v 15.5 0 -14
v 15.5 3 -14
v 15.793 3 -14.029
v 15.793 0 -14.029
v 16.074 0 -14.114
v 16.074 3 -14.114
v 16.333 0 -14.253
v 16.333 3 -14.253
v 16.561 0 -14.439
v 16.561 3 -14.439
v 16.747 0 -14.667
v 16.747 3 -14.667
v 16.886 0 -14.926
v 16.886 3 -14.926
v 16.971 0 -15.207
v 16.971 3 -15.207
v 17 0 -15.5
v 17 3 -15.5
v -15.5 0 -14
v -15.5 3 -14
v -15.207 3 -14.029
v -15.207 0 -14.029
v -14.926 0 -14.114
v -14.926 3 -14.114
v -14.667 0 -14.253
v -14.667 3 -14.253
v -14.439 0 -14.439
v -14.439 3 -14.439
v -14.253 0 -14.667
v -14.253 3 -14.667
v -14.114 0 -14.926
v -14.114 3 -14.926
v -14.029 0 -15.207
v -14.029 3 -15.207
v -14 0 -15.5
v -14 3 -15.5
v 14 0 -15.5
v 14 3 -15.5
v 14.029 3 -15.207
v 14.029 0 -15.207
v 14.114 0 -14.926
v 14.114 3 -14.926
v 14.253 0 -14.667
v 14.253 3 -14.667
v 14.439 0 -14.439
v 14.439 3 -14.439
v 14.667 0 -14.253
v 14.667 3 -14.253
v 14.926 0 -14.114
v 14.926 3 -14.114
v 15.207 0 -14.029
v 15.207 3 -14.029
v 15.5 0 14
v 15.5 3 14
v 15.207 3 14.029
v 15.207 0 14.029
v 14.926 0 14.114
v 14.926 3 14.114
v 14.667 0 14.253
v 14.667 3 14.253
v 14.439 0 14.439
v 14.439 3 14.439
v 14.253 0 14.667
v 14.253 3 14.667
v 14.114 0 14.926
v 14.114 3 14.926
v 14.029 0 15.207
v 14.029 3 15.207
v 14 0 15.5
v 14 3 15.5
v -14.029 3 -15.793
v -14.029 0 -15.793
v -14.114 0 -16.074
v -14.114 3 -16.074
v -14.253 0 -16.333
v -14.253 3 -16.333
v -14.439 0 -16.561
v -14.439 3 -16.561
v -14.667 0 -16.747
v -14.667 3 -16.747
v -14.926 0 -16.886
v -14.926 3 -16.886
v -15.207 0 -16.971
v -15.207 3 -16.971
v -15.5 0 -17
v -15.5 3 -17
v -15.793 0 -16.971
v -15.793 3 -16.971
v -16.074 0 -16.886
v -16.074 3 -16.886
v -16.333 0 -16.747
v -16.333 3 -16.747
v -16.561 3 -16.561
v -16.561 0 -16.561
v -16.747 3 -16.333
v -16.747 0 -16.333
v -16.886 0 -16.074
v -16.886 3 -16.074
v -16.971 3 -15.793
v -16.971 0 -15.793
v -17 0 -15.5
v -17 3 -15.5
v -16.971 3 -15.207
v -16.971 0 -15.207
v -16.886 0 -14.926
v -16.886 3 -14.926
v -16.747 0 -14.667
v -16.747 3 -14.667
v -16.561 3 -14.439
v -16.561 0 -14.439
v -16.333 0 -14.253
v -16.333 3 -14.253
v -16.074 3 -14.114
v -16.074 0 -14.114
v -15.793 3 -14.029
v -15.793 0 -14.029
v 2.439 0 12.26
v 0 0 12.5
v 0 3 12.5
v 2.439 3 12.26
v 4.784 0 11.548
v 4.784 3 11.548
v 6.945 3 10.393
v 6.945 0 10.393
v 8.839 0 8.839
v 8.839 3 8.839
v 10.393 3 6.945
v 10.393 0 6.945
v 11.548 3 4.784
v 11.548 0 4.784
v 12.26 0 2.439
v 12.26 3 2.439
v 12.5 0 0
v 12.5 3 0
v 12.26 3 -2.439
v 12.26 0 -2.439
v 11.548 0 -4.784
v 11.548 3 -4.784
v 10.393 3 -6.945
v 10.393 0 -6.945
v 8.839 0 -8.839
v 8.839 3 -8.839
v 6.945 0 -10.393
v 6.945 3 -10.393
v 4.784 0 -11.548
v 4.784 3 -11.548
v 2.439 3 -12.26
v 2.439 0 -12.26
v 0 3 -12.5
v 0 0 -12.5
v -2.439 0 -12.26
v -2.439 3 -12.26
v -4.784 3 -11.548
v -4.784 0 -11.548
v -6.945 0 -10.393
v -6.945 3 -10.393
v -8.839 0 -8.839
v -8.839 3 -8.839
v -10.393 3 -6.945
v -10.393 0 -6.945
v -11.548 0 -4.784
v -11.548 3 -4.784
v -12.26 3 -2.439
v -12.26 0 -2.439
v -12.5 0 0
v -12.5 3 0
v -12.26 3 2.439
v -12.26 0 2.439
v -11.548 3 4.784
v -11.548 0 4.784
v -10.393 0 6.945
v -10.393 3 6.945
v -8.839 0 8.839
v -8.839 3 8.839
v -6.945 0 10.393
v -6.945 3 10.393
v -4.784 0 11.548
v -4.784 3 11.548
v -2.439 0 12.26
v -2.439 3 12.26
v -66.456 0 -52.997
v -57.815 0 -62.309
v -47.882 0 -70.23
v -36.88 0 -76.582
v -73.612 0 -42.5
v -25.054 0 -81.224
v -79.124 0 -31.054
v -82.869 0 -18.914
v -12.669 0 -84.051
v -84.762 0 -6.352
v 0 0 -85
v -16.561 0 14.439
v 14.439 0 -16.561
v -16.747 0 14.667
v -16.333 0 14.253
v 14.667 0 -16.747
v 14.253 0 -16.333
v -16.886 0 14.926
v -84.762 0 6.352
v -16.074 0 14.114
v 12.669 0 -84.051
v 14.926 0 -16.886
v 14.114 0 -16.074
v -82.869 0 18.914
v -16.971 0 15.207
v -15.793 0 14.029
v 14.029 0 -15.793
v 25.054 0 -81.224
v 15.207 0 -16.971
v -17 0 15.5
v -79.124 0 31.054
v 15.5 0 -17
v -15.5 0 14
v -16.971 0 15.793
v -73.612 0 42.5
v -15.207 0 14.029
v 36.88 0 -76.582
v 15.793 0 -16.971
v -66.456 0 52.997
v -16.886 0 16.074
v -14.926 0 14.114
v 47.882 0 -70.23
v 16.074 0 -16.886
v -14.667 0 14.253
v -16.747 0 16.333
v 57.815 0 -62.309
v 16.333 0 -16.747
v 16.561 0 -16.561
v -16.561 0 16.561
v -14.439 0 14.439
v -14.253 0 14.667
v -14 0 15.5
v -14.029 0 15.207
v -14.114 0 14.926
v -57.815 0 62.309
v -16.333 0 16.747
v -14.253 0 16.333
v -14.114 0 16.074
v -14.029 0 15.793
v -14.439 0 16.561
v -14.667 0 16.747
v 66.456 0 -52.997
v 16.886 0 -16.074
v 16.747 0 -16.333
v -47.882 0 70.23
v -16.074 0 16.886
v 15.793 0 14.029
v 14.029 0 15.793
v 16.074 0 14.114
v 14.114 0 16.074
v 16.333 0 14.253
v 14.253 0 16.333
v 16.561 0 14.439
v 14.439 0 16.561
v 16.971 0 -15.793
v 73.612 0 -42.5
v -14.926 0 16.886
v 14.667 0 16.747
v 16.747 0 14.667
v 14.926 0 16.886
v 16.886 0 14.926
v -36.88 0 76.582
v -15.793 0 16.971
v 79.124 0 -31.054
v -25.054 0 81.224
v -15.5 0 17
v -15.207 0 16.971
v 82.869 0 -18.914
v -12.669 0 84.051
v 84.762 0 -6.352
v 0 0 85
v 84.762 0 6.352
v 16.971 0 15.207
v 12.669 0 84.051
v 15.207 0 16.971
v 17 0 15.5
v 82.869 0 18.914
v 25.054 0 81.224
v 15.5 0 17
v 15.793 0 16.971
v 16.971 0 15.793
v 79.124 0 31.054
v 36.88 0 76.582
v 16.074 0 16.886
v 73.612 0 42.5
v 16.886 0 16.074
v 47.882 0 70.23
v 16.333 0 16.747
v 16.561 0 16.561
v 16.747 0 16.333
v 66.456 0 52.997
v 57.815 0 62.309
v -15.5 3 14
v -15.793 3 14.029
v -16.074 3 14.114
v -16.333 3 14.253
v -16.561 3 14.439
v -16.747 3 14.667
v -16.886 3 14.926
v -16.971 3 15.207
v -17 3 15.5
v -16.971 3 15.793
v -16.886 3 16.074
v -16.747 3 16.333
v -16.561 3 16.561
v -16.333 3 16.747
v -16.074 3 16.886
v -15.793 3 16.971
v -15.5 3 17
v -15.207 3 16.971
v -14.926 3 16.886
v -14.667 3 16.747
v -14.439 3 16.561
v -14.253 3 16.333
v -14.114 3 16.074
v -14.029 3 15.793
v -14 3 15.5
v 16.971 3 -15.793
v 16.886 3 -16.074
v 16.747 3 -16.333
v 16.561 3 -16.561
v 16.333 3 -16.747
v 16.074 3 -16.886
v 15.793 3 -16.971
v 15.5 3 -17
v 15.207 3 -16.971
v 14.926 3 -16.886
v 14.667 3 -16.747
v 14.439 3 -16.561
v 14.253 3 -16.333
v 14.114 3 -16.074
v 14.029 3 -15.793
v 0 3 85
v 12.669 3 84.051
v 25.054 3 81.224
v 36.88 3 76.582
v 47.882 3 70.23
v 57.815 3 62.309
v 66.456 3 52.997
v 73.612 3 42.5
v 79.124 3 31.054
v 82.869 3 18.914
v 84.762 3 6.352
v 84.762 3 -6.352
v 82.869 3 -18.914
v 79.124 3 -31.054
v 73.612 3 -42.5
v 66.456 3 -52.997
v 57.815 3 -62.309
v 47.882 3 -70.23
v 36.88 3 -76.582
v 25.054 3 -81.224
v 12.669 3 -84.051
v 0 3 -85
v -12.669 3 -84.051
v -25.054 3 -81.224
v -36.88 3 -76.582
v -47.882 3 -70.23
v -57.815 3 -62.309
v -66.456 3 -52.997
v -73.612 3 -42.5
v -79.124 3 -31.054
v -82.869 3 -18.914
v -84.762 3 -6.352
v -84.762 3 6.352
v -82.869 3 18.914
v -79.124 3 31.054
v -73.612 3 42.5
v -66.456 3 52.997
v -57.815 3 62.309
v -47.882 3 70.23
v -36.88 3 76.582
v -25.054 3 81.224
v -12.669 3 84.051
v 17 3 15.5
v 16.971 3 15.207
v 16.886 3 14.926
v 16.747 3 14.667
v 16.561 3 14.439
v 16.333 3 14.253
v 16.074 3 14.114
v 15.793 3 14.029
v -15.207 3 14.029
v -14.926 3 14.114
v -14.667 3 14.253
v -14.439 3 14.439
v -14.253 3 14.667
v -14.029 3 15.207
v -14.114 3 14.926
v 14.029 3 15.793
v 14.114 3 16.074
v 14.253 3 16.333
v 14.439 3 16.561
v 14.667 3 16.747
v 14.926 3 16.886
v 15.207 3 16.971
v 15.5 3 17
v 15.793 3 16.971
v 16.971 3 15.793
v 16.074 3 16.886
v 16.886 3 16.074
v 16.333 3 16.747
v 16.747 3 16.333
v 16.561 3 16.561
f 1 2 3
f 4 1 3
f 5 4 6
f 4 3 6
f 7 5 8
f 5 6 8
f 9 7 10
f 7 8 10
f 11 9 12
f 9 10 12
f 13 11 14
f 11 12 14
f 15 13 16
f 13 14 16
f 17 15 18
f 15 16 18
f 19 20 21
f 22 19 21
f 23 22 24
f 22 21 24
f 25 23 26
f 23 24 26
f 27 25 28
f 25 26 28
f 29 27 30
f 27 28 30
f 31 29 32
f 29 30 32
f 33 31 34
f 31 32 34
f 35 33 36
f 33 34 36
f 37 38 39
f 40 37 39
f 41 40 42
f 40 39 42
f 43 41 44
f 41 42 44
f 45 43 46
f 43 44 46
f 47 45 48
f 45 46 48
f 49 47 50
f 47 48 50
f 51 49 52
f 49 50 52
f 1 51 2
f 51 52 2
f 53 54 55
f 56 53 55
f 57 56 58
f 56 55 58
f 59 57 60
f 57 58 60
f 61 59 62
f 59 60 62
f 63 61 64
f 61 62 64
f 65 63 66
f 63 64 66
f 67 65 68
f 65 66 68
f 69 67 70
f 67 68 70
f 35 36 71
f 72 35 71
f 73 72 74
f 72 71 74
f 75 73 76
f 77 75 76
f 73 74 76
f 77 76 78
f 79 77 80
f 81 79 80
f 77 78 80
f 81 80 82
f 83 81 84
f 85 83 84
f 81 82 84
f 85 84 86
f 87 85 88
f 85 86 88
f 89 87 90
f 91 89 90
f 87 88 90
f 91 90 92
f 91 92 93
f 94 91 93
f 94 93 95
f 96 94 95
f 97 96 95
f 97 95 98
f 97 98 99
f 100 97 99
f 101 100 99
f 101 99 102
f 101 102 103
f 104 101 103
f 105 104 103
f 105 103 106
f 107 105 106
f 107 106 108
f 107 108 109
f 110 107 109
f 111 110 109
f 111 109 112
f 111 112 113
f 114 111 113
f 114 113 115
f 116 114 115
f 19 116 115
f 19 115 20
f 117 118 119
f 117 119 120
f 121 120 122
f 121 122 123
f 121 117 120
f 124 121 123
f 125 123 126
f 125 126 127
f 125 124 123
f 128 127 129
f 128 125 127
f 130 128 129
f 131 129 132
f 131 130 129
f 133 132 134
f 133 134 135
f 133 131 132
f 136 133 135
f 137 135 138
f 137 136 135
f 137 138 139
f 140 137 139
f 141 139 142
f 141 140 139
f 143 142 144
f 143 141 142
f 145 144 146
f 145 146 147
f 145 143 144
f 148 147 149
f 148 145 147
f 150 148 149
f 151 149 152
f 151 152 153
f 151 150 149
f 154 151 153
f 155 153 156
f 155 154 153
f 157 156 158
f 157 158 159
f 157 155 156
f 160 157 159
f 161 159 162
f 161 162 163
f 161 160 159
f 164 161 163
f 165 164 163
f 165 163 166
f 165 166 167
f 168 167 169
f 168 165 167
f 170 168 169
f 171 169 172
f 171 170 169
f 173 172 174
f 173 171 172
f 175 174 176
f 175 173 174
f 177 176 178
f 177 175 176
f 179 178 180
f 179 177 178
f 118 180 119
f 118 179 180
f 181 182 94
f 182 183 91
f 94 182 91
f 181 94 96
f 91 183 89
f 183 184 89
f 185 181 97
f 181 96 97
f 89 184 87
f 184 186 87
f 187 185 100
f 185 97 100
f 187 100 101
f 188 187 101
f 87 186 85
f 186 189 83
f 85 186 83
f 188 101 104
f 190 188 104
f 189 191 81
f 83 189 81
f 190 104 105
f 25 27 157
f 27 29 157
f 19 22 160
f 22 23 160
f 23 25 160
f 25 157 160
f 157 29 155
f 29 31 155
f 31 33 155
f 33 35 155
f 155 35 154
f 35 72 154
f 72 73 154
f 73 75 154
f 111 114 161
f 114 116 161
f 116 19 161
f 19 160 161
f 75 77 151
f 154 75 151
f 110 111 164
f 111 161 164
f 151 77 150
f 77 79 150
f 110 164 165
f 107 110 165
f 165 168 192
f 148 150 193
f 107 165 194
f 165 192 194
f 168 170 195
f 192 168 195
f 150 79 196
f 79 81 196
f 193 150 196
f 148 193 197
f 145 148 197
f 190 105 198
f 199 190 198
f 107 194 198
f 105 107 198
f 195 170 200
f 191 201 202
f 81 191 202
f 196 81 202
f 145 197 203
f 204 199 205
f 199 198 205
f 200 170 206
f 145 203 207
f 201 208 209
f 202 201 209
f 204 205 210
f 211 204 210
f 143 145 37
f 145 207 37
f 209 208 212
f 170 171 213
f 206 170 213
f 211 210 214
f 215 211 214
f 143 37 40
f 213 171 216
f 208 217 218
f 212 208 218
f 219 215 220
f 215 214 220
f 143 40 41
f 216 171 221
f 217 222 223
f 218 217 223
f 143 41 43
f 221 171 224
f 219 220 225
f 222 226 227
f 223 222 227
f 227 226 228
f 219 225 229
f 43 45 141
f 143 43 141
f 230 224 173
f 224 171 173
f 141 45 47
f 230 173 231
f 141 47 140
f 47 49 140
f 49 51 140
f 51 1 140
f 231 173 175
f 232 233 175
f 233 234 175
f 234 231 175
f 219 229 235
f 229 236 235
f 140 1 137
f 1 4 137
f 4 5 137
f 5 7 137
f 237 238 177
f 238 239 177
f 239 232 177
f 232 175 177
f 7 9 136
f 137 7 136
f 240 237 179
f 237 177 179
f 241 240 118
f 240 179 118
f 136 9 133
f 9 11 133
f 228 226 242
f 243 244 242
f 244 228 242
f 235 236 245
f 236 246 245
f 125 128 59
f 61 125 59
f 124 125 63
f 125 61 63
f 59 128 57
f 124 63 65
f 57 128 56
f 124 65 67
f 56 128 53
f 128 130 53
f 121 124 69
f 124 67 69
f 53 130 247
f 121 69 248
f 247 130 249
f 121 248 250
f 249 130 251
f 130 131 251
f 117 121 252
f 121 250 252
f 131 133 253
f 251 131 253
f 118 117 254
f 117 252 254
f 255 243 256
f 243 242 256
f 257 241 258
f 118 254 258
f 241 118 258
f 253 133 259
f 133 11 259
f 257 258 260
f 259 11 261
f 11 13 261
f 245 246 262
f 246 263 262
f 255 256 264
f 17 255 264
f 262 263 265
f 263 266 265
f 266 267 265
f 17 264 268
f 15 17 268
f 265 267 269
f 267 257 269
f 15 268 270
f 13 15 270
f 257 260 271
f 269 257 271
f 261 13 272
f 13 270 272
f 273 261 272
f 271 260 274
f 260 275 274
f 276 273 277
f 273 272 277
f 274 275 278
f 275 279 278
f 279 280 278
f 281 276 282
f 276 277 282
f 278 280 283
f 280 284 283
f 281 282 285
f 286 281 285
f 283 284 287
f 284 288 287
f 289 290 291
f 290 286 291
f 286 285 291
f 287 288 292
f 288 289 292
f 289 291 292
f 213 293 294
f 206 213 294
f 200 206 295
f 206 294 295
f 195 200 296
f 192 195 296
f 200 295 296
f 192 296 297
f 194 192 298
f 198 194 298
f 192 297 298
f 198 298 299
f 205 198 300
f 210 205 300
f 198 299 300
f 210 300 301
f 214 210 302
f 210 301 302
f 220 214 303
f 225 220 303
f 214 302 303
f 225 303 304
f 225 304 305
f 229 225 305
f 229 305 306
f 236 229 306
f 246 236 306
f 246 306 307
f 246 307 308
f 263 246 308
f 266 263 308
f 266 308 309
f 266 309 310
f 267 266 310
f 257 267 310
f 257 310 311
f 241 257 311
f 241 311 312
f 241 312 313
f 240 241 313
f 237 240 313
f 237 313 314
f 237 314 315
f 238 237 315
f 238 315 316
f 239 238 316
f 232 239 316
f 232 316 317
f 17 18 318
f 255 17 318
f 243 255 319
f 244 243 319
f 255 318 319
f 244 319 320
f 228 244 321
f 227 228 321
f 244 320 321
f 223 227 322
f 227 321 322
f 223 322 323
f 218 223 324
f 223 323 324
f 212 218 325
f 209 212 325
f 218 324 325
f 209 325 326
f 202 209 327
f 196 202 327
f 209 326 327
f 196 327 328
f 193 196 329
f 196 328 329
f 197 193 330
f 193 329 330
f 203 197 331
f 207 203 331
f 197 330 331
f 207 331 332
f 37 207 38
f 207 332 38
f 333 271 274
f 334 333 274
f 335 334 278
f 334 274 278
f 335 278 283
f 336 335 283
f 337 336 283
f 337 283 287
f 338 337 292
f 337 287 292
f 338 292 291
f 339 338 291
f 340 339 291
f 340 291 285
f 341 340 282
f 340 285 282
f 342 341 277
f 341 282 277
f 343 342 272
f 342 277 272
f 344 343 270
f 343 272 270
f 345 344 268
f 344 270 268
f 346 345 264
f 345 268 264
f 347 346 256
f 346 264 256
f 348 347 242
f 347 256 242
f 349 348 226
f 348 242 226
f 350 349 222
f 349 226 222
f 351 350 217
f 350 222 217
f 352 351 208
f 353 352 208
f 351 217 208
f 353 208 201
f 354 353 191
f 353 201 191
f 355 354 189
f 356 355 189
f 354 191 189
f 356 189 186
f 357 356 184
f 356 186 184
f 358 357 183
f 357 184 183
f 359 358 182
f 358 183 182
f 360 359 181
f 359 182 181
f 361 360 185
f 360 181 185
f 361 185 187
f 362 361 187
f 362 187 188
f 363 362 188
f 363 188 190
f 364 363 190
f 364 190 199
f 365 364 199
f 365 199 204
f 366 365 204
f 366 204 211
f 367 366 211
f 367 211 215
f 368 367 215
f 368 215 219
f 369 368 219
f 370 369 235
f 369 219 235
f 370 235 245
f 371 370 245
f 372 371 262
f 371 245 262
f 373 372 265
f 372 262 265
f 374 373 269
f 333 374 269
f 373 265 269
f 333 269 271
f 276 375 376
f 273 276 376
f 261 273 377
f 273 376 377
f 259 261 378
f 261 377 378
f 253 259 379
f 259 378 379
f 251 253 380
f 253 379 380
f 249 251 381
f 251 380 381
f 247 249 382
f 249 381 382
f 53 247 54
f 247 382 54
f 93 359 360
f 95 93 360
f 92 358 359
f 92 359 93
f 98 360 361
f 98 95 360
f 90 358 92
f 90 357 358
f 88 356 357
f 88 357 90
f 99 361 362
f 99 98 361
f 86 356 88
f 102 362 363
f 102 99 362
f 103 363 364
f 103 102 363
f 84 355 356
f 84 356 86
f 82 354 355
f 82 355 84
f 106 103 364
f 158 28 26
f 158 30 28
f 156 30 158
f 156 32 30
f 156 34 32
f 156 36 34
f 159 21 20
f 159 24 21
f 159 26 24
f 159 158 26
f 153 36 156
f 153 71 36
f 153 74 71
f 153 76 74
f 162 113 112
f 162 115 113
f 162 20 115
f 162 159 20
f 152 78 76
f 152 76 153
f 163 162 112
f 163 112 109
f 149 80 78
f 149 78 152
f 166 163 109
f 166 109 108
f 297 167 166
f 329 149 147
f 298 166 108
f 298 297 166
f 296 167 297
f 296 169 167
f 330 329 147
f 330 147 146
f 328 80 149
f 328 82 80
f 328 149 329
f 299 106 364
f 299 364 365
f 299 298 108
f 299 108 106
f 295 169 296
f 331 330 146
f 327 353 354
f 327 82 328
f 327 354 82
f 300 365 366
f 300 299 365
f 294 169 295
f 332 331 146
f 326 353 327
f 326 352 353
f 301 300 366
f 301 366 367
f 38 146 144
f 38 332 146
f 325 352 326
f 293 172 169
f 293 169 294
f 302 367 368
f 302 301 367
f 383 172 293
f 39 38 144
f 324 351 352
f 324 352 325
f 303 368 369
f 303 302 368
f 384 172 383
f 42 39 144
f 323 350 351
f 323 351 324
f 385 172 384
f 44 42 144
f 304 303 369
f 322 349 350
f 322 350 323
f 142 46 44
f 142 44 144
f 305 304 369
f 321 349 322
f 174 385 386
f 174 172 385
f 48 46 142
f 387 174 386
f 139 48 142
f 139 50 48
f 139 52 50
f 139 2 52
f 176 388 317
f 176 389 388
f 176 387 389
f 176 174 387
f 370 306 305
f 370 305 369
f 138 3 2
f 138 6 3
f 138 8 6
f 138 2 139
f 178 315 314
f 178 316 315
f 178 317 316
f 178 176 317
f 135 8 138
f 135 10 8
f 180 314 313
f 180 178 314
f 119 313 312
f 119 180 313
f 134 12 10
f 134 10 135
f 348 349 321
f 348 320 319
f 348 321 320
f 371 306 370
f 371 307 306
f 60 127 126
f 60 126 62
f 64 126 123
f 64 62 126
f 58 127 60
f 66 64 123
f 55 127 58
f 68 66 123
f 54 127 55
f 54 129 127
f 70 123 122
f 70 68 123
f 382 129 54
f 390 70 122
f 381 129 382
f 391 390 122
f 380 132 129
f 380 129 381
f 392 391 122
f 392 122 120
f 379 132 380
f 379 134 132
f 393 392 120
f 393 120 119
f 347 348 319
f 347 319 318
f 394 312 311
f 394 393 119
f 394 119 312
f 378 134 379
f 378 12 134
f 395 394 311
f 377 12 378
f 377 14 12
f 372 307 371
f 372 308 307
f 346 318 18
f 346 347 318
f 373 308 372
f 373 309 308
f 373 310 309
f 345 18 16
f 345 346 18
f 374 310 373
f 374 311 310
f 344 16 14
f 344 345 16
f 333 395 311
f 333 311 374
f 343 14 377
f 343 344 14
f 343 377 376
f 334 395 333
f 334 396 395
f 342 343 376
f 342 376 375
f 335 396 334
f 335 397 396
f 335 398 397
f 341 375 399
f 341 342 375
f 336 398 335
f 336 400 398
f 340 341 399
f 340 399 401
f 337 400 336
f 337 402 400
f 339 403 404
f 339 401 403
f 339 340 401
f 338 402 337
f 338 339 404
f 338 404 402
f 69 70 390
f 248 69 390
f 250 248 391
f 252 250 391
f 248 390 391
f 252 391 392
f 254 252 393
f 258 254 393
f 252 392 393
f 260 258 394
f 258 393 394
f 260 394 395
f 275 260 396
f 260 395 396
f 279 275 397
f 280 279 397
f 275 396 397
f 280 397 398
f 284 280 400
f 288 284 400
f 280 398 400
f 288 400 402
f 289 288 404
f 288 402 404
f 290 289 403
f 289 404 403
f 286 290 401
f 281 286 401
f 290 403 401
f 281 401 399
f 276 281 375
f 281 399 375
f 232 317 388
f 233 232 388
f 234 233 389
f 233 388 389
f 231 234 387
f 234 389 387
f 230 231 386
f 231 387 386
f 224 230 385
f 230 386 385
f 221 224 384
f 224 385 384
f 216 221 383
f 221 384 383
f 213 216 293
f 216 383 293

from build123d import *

# Parameters (mm, degrees)
SKETCH1_R           = 85
SKETCH1_R_2         = 12.5
BOSS_EXTRUDE1_DEPTH = 3
CUT_EXTRUDE1_DEPTH  = 10


with BuildPart() as part:
    # Sketch1 → Boss-Extrude1 (new body)
    with BuildSketch(Plane(origin=(0, 0, 0), x_dir=(1, 0, 0), z_dir=(0, 1, 0))):
        with Locations(Location((0, 0, 0), (0, 0, 270))):
            Circle(SKETCH1_R)
        with Locations(Location((0, 0, 0), (0, 0, 270))):
            Circle(SKETCH1_R_2, mode=Mode.SUBTRACT)
    extrude(amount=BOSS_EXTRUDE1_DEPTH)

    # Sketch2 → Cut-Extrude1 (cut)
    with BuildSketch(Plane(origin=(0, 3, 0), x_dir=(1, 0, 0), z_dir=(0, 1, 0))):
        with BuildLine():
            ThreePointArc((-14, 15.5), (-16.560660172, 16.560660172), (-15.5, 14))
            Line((-15.5, 14), (-15.5, 15.5))
            Line((-15.5, 15.5), (-14, 15.5))
        make_face()
        with BuildLine():
            Line((-15.5, 15.5), (-15.5, 14))
            ThreePointArc((-15.5, 14), (-14.439339828, 14.439339828), (-14, 15.5))
            Line((-14, 15.5), (-15.5, 15.5))
        make_face()
        with BuildLine():
            ThreePointArc((14, 15.5), (14.439339828, 14.439339828), (15.5, 14))
            Line((15.5, 14), (15.5, 15.5))
            Line((15.5, 15.5), (14, 15.5))
        make_face()
        with BuildLine():
            Line((15.5, 15.5), (15.5, 14))
            ThreePointArc((15.5, 14), (16.560660172, 14.439339828), (17, 15.5))
            ThreePointArc((17, 15.5), (15.5, 17), (14, 15.5))
            Line((14, 15.5), (15.5, 15.5))
        make_face()
        with BuildLine():
            ThreePointArc((15.5, -14), (14.439339828, -14.439339828), (14, -15.5))
            Line((14, -15.5), (15.5, -15.5))
            Line((15.5, -15.5), (15.5, -14))
        make_face()
        with BuildLine():
            Line((15.5, -15.5), (14, -15.5))
            ThreePointArc((14, -15.5), (15.5, -17), (17, -15.5))
            ThreePointArc((17, -15.5), (16.560660172, -14.439339828), (15.5, -14))
            Line((15.5, -14), (15.5, -15.5))
        make_face()
        with BuildLine():
            Line((-15.5, -14), (-15.5, -15.5))
            Line((-15.5, -15.5), (-14, -15.5))
            ThreePointArc((-14, -15.5), (-14.439339828, -14.439339828), (-15.5, -14))
        make_face()
        with BuildLine():
            Line((-14, -15.5), (-15.5, -15.5))
            Line((-15.5, -15.5), (-15.5, -14))
            ThreePointArc((-15.5, -14), (-16.560660172, -16.560660172), (-14, -15.5))
        make_face()
    extrude(amount=-CUT_EXTRUDE1_DEPTH, mode=Mode.SUBTRACT)


solid = part.part
